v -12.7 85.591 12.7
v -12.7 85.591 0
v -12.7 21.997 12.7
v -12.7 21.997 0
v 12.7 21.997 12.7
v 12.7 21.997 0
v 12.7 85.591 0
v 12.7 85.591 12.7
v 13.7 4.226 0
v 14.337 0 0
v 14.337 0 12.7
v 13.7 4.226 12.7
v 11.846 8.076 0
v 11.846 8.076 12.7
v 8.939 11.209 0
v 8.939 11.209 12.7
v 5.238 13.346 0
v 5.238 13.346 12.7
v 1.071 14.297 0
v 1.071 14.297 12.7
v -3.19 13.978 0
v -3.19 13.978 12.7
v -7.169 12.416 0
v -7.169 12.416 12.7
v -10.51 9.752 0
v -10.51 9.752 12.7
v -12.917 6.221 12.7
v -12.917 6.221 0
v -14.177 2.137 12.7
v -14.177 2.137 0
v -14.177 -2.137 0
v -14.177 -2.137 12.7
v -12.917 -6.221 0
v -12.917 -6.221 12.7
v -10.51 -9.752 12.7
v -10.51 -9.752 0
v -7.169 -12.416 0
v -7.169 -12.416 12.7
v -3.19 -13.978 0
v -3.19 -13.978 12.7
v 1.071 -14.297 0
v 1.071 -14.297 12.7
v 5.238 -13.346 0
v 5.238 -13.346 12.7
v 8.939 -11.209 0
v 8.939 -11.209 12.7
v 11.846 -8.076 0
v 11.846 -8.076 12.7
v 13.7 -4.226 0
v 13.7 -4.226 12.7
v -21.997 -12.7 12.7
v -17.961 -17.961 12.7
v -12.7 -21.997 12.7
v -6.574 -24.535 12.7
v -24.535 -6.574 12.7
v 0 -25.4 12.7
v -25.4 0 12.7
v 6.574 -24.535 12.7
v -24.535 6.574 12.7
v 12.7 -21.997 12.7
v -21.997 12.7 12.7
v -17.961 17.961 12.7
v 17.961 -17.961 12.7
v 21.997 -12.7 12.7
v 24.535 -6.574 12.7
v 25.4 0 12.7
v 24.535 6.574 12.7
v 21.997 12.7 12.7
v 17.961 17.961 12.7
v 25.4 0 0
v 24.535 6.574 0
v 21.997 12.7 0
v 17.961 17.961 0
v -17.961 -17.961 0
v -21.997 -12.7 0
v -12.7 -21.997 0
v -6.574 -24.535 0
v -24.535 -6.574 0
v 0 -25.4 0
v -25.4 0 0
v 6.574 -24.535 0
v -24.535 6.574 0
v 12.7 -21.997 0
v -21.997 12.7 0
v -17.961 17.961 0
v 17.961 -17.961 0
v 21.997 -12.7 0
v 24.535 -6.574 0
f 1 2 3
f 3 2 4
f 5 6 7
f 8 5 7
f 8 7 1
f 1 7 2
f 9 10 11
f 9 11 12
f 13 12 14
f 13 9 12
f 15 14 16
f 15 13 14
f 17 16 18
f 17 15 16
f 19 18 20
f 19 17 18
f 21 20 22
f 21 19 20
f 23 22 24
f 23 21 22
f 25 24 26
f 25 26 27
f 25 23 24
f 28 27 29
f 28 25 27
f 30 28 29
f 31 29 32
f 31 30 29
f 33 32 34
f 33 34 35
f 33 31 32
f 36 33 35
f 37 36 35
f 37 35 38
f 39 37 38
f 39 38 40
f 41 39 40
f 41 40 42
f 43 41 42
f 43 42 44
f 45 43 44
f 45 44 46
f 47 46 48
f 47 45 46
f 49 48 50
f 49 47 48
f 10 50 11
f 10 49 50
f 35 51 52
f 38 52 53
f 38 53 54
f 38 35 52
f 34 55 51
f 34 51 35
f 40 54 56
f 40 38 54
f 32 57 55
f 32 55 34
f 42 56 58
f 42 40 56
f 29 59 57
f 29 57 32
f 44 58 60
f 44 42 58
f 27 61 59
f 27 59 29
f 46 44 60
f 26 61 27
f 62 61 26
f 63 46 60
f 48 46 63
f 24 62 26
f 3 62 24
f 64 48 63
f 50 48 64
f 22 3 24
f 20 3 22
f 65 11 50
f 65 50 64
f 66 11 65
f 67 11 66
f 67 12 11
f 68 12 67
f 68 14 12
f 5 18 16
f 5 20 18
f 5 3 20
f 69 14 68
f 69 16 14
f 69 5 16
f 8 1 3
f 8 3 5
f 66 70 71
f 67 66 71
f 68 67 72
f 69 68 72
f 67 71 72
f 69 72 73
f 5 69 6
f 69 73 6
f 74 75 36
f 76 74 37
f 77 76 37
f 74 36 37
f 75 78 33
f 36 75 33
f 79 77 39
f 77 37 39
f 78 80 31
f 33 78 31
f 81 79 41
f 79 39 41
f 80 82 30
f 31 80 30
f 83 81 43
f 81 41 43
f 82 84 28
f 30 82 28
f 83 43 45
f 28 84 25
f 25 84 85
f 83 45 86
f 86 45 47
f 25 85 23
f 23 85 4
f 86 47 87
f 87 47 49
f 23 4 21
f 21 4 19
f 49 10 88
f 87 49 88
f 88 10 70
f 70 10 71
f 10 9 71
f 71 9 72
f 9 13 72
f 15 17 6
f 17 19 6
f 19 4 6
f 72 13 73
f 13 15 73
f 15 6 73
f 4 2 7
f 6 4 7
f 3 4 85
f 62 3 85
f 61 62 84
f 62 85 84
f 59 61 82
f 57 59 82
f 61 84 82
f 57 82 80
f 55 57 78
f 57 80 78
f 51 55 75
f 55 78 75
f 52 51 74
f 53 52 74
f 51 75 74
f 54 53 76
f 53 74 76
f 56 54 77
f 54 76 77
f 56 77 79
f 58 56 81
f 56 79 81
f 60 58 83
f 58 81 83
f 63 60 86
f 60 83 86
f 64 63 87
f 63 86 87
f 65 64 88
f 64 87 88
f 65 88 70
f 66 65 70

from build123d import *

# Parameters (mm, degrees)
F0_R     = 14.3372968019
F1_DEPTH = 12.7


# Not quite as in the source:
# - a feature names something its author has since deleted; it is built from what else it names


with BuildPart() as f1:
    # F0 (on Top) → F1 (new body)
    with BuildSketch(Plane.XY):
        with BuildLine():
            ThreePointArc((-12.7, 21.9970452561), (0, 25.4), (12.7, 21.9970452561))
            Line((12.7, 21.9970452561), (12.7, 85.5907872319))
            Line((12.7, 85.5907872319), (0, 85.5907872319))
            Line((0, 85.5907872319), (-12.7, 85.5907872319))
            Line((-12.7, 85.5907872319), (-12.7, 21.9970452561))
        make_face()
        with BuildLine():
            ThreePointArc((-12.7, 21.9970452561), (-12.7, -21.9970452561), (25.4, 0))
            ThreePointArc((25.4, 0), (21.9970452561, 12.7), (12.7, 21.9970452561))
            ThreePointArc((12.7, 21.9970452561), (0, 25.4), (-12.7, 21.9970452561))
        make_face()
        Circle(F0_R, mode=Mode.SUBTRACT)
    extrude(amount=F1_DEPTH)


solid = f1.part
